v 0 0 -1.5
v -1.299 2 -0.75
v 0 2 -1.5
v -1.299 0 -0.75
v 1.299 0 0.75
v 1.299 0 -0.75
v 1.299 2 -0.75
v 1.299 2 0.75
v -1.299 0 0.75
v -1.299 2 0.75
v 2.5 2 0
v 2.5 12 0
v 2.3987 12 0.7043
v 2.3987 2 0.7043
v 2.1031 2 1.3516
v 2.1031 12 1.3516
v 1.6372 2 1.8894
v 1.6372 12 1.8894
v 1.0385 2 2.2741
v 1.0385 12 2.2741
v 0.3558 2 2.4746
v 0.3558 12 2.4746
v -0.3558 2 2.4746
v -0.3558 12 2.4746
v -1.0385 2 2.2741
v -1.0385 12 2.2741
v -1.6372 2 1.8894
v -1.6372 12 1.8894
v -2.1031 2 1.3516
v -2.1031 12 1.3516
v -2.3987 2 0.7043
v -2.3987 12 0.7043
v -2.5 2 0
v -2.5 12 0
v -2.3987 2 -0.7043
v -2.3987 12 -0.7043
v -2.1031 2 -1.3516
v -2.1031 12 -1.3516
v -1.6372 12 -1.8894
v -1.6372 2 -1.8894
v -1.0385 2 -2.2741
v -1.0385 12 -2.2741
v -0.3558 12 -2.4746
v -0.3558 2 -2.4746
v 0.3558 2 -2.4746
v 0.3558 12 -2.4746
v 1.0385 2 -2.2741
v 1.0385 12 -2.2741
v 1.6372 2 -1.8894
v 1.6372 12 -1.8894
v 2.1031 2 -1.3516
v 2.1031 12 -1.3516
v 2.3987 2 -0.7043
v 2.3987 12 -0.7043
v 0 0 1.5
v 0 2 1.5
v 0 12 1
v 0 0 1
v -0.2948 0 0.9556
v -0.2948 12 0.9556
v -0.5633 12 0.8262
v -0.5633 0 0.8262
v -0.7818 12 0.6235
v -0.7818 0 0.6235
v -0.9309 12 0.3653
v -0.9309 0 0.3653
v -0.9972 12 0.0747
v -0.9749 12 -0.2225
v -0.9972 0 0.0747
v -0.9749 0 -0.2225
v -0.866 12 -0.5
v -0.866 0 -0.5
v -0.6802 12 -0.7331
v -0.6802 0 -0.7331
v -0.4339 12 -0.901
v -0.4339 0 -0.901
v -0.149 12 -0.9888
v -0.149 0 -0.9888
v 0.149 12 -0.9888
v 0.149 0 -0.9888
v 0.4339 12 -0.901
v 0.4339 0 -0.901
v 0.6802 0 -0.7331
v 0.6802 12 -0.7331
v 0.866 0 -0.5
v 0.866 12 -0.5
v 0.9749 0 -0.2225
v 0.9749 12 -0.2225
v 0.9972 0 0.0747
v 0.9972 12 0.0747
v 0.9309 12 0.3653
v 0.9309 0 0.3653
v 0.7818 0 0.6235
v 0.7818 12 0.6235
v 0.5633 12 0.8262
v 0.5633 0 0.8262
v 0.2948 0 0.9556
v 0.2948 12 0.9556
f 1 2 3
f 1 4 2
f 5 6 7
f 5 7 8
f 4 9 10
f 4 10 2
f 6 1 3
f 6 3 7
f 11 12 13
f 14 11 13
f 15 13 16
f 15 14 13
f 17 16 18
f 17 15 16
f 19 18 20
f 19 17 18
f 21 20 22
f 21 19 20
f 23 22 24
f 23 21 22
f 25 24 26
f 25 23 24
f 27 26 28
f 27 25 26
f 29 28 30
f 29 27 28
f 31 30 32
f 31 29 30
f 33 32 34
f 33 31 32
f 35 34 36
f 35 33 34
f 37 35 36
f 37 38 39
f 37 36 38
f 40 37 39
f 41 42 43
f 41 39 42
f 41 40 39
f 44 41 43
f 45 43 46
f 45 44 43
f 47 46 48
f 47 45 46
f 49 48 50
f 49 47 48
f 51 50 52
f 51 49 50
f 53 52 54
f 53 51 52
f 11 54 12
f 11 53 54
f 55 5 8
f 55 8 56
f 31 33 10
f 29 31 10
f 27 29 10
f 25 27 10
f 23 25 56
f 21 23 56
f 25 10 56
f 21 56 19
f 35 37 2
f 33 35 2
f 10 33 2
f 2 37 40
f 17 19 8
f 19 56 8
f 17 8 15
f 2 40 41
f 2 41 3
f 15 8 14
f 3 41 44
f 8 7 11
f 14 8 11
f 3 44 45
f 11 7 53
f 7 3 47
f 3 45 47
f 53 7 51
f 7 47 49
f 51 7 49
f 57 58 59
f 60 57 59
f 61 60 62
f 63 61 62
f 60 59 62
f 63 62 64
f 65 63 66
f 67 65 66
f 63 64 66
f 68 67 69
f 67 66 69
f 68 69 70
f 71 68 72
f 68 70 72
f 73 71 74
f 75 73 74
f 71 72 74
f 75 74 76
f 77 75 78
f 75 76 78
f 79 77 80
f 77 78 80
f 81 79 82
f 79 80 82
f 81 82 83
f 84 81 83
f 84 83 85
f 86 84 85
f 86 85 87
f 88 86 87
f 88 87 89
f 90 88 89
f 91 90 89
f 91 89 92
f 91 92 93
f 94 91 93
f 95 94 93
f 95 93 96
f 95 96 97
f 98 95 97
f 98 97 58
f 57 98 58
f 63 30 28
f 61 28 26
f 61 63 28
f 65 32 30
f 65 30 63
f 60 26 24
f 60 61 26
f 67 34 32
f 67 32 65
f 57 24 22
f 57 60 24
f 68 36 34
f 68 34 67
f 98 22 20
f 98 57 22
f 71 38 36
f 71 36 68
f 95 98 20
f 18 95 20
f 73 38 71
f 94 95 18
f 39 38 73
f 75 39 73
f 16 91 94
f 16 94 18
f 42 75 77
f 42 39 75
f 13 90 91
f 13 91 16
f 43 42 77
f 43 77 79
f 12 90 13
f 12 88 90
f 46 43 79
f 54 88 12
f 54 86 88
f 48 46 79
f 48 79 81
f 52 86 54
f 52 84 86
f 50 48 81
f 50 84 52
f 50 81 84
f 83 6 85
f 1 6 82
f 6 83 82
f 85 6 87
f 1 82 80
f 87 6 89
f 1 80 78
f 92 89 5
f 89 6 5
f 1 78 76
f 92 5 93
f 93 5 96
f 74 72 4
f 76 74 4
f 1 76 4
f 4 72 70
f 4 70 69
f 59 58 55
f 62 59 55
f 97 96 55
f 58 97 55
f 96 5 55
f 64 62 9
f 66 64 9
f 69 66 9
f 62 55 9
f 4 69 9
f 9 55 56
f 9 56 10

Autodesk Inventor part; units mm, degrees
ref_plane "YZ Plane" through (0, 0, 0) normal (1, 0, 0) x (0, 1, 0)
ref_plane "XZ Plane" through (0, 0, 0) normal (0, 1, 0) x (-1, 0, 0)
ref_plane "XY Plane" through (0, 0, 0) normal (0, 0, 1) x (1, 0, 0)
sketch "Sketch1" plane through (0, 0, 0) normal (0, 1, 0) x (-1, 0, 0)
  circle A0 centre (0, 0) radius 1.5 construction
  line L0 (0, -1.5) -> (-1.299, -0.75)
  line L1 (-1.299, -0.75) -> (-1.299, 0.75)
  line L2 (-1.299, 0.75) -> (0, 1.5)
  line L3 (0, 1.5) -> (1.299, 0.75)
  line L4 (1.299, 0.75) -> (1.299, -0.75)
  line L5 (1.299, -0.75) -> (0, -1.5)
  dimension "d0" = 3
extrude "Extrusion1" add sketch "Sketch1" along normal blind 2
sketch "Sketch2" plane through (0, 2, 0) normal (0, 1, 0) x (1, 0, 0)
  circle A0 centre (0, 0) radius 2.5
  dimension "d3" = 5
extrude "Extrusion2" add sketch "Sketch2" along normal blind 10
sketch "Sketch3" plane through (0, 12, 0) normal (0, 1, 0) x (1, 0, 0)
  circle A0 centre (0, 0) radius 2.5 projected
hole "Hole1" at (0, 12, 0) direction (0, -1, 0) diameter 2 end through all
properties part number "separator" material "PET Plastic"
